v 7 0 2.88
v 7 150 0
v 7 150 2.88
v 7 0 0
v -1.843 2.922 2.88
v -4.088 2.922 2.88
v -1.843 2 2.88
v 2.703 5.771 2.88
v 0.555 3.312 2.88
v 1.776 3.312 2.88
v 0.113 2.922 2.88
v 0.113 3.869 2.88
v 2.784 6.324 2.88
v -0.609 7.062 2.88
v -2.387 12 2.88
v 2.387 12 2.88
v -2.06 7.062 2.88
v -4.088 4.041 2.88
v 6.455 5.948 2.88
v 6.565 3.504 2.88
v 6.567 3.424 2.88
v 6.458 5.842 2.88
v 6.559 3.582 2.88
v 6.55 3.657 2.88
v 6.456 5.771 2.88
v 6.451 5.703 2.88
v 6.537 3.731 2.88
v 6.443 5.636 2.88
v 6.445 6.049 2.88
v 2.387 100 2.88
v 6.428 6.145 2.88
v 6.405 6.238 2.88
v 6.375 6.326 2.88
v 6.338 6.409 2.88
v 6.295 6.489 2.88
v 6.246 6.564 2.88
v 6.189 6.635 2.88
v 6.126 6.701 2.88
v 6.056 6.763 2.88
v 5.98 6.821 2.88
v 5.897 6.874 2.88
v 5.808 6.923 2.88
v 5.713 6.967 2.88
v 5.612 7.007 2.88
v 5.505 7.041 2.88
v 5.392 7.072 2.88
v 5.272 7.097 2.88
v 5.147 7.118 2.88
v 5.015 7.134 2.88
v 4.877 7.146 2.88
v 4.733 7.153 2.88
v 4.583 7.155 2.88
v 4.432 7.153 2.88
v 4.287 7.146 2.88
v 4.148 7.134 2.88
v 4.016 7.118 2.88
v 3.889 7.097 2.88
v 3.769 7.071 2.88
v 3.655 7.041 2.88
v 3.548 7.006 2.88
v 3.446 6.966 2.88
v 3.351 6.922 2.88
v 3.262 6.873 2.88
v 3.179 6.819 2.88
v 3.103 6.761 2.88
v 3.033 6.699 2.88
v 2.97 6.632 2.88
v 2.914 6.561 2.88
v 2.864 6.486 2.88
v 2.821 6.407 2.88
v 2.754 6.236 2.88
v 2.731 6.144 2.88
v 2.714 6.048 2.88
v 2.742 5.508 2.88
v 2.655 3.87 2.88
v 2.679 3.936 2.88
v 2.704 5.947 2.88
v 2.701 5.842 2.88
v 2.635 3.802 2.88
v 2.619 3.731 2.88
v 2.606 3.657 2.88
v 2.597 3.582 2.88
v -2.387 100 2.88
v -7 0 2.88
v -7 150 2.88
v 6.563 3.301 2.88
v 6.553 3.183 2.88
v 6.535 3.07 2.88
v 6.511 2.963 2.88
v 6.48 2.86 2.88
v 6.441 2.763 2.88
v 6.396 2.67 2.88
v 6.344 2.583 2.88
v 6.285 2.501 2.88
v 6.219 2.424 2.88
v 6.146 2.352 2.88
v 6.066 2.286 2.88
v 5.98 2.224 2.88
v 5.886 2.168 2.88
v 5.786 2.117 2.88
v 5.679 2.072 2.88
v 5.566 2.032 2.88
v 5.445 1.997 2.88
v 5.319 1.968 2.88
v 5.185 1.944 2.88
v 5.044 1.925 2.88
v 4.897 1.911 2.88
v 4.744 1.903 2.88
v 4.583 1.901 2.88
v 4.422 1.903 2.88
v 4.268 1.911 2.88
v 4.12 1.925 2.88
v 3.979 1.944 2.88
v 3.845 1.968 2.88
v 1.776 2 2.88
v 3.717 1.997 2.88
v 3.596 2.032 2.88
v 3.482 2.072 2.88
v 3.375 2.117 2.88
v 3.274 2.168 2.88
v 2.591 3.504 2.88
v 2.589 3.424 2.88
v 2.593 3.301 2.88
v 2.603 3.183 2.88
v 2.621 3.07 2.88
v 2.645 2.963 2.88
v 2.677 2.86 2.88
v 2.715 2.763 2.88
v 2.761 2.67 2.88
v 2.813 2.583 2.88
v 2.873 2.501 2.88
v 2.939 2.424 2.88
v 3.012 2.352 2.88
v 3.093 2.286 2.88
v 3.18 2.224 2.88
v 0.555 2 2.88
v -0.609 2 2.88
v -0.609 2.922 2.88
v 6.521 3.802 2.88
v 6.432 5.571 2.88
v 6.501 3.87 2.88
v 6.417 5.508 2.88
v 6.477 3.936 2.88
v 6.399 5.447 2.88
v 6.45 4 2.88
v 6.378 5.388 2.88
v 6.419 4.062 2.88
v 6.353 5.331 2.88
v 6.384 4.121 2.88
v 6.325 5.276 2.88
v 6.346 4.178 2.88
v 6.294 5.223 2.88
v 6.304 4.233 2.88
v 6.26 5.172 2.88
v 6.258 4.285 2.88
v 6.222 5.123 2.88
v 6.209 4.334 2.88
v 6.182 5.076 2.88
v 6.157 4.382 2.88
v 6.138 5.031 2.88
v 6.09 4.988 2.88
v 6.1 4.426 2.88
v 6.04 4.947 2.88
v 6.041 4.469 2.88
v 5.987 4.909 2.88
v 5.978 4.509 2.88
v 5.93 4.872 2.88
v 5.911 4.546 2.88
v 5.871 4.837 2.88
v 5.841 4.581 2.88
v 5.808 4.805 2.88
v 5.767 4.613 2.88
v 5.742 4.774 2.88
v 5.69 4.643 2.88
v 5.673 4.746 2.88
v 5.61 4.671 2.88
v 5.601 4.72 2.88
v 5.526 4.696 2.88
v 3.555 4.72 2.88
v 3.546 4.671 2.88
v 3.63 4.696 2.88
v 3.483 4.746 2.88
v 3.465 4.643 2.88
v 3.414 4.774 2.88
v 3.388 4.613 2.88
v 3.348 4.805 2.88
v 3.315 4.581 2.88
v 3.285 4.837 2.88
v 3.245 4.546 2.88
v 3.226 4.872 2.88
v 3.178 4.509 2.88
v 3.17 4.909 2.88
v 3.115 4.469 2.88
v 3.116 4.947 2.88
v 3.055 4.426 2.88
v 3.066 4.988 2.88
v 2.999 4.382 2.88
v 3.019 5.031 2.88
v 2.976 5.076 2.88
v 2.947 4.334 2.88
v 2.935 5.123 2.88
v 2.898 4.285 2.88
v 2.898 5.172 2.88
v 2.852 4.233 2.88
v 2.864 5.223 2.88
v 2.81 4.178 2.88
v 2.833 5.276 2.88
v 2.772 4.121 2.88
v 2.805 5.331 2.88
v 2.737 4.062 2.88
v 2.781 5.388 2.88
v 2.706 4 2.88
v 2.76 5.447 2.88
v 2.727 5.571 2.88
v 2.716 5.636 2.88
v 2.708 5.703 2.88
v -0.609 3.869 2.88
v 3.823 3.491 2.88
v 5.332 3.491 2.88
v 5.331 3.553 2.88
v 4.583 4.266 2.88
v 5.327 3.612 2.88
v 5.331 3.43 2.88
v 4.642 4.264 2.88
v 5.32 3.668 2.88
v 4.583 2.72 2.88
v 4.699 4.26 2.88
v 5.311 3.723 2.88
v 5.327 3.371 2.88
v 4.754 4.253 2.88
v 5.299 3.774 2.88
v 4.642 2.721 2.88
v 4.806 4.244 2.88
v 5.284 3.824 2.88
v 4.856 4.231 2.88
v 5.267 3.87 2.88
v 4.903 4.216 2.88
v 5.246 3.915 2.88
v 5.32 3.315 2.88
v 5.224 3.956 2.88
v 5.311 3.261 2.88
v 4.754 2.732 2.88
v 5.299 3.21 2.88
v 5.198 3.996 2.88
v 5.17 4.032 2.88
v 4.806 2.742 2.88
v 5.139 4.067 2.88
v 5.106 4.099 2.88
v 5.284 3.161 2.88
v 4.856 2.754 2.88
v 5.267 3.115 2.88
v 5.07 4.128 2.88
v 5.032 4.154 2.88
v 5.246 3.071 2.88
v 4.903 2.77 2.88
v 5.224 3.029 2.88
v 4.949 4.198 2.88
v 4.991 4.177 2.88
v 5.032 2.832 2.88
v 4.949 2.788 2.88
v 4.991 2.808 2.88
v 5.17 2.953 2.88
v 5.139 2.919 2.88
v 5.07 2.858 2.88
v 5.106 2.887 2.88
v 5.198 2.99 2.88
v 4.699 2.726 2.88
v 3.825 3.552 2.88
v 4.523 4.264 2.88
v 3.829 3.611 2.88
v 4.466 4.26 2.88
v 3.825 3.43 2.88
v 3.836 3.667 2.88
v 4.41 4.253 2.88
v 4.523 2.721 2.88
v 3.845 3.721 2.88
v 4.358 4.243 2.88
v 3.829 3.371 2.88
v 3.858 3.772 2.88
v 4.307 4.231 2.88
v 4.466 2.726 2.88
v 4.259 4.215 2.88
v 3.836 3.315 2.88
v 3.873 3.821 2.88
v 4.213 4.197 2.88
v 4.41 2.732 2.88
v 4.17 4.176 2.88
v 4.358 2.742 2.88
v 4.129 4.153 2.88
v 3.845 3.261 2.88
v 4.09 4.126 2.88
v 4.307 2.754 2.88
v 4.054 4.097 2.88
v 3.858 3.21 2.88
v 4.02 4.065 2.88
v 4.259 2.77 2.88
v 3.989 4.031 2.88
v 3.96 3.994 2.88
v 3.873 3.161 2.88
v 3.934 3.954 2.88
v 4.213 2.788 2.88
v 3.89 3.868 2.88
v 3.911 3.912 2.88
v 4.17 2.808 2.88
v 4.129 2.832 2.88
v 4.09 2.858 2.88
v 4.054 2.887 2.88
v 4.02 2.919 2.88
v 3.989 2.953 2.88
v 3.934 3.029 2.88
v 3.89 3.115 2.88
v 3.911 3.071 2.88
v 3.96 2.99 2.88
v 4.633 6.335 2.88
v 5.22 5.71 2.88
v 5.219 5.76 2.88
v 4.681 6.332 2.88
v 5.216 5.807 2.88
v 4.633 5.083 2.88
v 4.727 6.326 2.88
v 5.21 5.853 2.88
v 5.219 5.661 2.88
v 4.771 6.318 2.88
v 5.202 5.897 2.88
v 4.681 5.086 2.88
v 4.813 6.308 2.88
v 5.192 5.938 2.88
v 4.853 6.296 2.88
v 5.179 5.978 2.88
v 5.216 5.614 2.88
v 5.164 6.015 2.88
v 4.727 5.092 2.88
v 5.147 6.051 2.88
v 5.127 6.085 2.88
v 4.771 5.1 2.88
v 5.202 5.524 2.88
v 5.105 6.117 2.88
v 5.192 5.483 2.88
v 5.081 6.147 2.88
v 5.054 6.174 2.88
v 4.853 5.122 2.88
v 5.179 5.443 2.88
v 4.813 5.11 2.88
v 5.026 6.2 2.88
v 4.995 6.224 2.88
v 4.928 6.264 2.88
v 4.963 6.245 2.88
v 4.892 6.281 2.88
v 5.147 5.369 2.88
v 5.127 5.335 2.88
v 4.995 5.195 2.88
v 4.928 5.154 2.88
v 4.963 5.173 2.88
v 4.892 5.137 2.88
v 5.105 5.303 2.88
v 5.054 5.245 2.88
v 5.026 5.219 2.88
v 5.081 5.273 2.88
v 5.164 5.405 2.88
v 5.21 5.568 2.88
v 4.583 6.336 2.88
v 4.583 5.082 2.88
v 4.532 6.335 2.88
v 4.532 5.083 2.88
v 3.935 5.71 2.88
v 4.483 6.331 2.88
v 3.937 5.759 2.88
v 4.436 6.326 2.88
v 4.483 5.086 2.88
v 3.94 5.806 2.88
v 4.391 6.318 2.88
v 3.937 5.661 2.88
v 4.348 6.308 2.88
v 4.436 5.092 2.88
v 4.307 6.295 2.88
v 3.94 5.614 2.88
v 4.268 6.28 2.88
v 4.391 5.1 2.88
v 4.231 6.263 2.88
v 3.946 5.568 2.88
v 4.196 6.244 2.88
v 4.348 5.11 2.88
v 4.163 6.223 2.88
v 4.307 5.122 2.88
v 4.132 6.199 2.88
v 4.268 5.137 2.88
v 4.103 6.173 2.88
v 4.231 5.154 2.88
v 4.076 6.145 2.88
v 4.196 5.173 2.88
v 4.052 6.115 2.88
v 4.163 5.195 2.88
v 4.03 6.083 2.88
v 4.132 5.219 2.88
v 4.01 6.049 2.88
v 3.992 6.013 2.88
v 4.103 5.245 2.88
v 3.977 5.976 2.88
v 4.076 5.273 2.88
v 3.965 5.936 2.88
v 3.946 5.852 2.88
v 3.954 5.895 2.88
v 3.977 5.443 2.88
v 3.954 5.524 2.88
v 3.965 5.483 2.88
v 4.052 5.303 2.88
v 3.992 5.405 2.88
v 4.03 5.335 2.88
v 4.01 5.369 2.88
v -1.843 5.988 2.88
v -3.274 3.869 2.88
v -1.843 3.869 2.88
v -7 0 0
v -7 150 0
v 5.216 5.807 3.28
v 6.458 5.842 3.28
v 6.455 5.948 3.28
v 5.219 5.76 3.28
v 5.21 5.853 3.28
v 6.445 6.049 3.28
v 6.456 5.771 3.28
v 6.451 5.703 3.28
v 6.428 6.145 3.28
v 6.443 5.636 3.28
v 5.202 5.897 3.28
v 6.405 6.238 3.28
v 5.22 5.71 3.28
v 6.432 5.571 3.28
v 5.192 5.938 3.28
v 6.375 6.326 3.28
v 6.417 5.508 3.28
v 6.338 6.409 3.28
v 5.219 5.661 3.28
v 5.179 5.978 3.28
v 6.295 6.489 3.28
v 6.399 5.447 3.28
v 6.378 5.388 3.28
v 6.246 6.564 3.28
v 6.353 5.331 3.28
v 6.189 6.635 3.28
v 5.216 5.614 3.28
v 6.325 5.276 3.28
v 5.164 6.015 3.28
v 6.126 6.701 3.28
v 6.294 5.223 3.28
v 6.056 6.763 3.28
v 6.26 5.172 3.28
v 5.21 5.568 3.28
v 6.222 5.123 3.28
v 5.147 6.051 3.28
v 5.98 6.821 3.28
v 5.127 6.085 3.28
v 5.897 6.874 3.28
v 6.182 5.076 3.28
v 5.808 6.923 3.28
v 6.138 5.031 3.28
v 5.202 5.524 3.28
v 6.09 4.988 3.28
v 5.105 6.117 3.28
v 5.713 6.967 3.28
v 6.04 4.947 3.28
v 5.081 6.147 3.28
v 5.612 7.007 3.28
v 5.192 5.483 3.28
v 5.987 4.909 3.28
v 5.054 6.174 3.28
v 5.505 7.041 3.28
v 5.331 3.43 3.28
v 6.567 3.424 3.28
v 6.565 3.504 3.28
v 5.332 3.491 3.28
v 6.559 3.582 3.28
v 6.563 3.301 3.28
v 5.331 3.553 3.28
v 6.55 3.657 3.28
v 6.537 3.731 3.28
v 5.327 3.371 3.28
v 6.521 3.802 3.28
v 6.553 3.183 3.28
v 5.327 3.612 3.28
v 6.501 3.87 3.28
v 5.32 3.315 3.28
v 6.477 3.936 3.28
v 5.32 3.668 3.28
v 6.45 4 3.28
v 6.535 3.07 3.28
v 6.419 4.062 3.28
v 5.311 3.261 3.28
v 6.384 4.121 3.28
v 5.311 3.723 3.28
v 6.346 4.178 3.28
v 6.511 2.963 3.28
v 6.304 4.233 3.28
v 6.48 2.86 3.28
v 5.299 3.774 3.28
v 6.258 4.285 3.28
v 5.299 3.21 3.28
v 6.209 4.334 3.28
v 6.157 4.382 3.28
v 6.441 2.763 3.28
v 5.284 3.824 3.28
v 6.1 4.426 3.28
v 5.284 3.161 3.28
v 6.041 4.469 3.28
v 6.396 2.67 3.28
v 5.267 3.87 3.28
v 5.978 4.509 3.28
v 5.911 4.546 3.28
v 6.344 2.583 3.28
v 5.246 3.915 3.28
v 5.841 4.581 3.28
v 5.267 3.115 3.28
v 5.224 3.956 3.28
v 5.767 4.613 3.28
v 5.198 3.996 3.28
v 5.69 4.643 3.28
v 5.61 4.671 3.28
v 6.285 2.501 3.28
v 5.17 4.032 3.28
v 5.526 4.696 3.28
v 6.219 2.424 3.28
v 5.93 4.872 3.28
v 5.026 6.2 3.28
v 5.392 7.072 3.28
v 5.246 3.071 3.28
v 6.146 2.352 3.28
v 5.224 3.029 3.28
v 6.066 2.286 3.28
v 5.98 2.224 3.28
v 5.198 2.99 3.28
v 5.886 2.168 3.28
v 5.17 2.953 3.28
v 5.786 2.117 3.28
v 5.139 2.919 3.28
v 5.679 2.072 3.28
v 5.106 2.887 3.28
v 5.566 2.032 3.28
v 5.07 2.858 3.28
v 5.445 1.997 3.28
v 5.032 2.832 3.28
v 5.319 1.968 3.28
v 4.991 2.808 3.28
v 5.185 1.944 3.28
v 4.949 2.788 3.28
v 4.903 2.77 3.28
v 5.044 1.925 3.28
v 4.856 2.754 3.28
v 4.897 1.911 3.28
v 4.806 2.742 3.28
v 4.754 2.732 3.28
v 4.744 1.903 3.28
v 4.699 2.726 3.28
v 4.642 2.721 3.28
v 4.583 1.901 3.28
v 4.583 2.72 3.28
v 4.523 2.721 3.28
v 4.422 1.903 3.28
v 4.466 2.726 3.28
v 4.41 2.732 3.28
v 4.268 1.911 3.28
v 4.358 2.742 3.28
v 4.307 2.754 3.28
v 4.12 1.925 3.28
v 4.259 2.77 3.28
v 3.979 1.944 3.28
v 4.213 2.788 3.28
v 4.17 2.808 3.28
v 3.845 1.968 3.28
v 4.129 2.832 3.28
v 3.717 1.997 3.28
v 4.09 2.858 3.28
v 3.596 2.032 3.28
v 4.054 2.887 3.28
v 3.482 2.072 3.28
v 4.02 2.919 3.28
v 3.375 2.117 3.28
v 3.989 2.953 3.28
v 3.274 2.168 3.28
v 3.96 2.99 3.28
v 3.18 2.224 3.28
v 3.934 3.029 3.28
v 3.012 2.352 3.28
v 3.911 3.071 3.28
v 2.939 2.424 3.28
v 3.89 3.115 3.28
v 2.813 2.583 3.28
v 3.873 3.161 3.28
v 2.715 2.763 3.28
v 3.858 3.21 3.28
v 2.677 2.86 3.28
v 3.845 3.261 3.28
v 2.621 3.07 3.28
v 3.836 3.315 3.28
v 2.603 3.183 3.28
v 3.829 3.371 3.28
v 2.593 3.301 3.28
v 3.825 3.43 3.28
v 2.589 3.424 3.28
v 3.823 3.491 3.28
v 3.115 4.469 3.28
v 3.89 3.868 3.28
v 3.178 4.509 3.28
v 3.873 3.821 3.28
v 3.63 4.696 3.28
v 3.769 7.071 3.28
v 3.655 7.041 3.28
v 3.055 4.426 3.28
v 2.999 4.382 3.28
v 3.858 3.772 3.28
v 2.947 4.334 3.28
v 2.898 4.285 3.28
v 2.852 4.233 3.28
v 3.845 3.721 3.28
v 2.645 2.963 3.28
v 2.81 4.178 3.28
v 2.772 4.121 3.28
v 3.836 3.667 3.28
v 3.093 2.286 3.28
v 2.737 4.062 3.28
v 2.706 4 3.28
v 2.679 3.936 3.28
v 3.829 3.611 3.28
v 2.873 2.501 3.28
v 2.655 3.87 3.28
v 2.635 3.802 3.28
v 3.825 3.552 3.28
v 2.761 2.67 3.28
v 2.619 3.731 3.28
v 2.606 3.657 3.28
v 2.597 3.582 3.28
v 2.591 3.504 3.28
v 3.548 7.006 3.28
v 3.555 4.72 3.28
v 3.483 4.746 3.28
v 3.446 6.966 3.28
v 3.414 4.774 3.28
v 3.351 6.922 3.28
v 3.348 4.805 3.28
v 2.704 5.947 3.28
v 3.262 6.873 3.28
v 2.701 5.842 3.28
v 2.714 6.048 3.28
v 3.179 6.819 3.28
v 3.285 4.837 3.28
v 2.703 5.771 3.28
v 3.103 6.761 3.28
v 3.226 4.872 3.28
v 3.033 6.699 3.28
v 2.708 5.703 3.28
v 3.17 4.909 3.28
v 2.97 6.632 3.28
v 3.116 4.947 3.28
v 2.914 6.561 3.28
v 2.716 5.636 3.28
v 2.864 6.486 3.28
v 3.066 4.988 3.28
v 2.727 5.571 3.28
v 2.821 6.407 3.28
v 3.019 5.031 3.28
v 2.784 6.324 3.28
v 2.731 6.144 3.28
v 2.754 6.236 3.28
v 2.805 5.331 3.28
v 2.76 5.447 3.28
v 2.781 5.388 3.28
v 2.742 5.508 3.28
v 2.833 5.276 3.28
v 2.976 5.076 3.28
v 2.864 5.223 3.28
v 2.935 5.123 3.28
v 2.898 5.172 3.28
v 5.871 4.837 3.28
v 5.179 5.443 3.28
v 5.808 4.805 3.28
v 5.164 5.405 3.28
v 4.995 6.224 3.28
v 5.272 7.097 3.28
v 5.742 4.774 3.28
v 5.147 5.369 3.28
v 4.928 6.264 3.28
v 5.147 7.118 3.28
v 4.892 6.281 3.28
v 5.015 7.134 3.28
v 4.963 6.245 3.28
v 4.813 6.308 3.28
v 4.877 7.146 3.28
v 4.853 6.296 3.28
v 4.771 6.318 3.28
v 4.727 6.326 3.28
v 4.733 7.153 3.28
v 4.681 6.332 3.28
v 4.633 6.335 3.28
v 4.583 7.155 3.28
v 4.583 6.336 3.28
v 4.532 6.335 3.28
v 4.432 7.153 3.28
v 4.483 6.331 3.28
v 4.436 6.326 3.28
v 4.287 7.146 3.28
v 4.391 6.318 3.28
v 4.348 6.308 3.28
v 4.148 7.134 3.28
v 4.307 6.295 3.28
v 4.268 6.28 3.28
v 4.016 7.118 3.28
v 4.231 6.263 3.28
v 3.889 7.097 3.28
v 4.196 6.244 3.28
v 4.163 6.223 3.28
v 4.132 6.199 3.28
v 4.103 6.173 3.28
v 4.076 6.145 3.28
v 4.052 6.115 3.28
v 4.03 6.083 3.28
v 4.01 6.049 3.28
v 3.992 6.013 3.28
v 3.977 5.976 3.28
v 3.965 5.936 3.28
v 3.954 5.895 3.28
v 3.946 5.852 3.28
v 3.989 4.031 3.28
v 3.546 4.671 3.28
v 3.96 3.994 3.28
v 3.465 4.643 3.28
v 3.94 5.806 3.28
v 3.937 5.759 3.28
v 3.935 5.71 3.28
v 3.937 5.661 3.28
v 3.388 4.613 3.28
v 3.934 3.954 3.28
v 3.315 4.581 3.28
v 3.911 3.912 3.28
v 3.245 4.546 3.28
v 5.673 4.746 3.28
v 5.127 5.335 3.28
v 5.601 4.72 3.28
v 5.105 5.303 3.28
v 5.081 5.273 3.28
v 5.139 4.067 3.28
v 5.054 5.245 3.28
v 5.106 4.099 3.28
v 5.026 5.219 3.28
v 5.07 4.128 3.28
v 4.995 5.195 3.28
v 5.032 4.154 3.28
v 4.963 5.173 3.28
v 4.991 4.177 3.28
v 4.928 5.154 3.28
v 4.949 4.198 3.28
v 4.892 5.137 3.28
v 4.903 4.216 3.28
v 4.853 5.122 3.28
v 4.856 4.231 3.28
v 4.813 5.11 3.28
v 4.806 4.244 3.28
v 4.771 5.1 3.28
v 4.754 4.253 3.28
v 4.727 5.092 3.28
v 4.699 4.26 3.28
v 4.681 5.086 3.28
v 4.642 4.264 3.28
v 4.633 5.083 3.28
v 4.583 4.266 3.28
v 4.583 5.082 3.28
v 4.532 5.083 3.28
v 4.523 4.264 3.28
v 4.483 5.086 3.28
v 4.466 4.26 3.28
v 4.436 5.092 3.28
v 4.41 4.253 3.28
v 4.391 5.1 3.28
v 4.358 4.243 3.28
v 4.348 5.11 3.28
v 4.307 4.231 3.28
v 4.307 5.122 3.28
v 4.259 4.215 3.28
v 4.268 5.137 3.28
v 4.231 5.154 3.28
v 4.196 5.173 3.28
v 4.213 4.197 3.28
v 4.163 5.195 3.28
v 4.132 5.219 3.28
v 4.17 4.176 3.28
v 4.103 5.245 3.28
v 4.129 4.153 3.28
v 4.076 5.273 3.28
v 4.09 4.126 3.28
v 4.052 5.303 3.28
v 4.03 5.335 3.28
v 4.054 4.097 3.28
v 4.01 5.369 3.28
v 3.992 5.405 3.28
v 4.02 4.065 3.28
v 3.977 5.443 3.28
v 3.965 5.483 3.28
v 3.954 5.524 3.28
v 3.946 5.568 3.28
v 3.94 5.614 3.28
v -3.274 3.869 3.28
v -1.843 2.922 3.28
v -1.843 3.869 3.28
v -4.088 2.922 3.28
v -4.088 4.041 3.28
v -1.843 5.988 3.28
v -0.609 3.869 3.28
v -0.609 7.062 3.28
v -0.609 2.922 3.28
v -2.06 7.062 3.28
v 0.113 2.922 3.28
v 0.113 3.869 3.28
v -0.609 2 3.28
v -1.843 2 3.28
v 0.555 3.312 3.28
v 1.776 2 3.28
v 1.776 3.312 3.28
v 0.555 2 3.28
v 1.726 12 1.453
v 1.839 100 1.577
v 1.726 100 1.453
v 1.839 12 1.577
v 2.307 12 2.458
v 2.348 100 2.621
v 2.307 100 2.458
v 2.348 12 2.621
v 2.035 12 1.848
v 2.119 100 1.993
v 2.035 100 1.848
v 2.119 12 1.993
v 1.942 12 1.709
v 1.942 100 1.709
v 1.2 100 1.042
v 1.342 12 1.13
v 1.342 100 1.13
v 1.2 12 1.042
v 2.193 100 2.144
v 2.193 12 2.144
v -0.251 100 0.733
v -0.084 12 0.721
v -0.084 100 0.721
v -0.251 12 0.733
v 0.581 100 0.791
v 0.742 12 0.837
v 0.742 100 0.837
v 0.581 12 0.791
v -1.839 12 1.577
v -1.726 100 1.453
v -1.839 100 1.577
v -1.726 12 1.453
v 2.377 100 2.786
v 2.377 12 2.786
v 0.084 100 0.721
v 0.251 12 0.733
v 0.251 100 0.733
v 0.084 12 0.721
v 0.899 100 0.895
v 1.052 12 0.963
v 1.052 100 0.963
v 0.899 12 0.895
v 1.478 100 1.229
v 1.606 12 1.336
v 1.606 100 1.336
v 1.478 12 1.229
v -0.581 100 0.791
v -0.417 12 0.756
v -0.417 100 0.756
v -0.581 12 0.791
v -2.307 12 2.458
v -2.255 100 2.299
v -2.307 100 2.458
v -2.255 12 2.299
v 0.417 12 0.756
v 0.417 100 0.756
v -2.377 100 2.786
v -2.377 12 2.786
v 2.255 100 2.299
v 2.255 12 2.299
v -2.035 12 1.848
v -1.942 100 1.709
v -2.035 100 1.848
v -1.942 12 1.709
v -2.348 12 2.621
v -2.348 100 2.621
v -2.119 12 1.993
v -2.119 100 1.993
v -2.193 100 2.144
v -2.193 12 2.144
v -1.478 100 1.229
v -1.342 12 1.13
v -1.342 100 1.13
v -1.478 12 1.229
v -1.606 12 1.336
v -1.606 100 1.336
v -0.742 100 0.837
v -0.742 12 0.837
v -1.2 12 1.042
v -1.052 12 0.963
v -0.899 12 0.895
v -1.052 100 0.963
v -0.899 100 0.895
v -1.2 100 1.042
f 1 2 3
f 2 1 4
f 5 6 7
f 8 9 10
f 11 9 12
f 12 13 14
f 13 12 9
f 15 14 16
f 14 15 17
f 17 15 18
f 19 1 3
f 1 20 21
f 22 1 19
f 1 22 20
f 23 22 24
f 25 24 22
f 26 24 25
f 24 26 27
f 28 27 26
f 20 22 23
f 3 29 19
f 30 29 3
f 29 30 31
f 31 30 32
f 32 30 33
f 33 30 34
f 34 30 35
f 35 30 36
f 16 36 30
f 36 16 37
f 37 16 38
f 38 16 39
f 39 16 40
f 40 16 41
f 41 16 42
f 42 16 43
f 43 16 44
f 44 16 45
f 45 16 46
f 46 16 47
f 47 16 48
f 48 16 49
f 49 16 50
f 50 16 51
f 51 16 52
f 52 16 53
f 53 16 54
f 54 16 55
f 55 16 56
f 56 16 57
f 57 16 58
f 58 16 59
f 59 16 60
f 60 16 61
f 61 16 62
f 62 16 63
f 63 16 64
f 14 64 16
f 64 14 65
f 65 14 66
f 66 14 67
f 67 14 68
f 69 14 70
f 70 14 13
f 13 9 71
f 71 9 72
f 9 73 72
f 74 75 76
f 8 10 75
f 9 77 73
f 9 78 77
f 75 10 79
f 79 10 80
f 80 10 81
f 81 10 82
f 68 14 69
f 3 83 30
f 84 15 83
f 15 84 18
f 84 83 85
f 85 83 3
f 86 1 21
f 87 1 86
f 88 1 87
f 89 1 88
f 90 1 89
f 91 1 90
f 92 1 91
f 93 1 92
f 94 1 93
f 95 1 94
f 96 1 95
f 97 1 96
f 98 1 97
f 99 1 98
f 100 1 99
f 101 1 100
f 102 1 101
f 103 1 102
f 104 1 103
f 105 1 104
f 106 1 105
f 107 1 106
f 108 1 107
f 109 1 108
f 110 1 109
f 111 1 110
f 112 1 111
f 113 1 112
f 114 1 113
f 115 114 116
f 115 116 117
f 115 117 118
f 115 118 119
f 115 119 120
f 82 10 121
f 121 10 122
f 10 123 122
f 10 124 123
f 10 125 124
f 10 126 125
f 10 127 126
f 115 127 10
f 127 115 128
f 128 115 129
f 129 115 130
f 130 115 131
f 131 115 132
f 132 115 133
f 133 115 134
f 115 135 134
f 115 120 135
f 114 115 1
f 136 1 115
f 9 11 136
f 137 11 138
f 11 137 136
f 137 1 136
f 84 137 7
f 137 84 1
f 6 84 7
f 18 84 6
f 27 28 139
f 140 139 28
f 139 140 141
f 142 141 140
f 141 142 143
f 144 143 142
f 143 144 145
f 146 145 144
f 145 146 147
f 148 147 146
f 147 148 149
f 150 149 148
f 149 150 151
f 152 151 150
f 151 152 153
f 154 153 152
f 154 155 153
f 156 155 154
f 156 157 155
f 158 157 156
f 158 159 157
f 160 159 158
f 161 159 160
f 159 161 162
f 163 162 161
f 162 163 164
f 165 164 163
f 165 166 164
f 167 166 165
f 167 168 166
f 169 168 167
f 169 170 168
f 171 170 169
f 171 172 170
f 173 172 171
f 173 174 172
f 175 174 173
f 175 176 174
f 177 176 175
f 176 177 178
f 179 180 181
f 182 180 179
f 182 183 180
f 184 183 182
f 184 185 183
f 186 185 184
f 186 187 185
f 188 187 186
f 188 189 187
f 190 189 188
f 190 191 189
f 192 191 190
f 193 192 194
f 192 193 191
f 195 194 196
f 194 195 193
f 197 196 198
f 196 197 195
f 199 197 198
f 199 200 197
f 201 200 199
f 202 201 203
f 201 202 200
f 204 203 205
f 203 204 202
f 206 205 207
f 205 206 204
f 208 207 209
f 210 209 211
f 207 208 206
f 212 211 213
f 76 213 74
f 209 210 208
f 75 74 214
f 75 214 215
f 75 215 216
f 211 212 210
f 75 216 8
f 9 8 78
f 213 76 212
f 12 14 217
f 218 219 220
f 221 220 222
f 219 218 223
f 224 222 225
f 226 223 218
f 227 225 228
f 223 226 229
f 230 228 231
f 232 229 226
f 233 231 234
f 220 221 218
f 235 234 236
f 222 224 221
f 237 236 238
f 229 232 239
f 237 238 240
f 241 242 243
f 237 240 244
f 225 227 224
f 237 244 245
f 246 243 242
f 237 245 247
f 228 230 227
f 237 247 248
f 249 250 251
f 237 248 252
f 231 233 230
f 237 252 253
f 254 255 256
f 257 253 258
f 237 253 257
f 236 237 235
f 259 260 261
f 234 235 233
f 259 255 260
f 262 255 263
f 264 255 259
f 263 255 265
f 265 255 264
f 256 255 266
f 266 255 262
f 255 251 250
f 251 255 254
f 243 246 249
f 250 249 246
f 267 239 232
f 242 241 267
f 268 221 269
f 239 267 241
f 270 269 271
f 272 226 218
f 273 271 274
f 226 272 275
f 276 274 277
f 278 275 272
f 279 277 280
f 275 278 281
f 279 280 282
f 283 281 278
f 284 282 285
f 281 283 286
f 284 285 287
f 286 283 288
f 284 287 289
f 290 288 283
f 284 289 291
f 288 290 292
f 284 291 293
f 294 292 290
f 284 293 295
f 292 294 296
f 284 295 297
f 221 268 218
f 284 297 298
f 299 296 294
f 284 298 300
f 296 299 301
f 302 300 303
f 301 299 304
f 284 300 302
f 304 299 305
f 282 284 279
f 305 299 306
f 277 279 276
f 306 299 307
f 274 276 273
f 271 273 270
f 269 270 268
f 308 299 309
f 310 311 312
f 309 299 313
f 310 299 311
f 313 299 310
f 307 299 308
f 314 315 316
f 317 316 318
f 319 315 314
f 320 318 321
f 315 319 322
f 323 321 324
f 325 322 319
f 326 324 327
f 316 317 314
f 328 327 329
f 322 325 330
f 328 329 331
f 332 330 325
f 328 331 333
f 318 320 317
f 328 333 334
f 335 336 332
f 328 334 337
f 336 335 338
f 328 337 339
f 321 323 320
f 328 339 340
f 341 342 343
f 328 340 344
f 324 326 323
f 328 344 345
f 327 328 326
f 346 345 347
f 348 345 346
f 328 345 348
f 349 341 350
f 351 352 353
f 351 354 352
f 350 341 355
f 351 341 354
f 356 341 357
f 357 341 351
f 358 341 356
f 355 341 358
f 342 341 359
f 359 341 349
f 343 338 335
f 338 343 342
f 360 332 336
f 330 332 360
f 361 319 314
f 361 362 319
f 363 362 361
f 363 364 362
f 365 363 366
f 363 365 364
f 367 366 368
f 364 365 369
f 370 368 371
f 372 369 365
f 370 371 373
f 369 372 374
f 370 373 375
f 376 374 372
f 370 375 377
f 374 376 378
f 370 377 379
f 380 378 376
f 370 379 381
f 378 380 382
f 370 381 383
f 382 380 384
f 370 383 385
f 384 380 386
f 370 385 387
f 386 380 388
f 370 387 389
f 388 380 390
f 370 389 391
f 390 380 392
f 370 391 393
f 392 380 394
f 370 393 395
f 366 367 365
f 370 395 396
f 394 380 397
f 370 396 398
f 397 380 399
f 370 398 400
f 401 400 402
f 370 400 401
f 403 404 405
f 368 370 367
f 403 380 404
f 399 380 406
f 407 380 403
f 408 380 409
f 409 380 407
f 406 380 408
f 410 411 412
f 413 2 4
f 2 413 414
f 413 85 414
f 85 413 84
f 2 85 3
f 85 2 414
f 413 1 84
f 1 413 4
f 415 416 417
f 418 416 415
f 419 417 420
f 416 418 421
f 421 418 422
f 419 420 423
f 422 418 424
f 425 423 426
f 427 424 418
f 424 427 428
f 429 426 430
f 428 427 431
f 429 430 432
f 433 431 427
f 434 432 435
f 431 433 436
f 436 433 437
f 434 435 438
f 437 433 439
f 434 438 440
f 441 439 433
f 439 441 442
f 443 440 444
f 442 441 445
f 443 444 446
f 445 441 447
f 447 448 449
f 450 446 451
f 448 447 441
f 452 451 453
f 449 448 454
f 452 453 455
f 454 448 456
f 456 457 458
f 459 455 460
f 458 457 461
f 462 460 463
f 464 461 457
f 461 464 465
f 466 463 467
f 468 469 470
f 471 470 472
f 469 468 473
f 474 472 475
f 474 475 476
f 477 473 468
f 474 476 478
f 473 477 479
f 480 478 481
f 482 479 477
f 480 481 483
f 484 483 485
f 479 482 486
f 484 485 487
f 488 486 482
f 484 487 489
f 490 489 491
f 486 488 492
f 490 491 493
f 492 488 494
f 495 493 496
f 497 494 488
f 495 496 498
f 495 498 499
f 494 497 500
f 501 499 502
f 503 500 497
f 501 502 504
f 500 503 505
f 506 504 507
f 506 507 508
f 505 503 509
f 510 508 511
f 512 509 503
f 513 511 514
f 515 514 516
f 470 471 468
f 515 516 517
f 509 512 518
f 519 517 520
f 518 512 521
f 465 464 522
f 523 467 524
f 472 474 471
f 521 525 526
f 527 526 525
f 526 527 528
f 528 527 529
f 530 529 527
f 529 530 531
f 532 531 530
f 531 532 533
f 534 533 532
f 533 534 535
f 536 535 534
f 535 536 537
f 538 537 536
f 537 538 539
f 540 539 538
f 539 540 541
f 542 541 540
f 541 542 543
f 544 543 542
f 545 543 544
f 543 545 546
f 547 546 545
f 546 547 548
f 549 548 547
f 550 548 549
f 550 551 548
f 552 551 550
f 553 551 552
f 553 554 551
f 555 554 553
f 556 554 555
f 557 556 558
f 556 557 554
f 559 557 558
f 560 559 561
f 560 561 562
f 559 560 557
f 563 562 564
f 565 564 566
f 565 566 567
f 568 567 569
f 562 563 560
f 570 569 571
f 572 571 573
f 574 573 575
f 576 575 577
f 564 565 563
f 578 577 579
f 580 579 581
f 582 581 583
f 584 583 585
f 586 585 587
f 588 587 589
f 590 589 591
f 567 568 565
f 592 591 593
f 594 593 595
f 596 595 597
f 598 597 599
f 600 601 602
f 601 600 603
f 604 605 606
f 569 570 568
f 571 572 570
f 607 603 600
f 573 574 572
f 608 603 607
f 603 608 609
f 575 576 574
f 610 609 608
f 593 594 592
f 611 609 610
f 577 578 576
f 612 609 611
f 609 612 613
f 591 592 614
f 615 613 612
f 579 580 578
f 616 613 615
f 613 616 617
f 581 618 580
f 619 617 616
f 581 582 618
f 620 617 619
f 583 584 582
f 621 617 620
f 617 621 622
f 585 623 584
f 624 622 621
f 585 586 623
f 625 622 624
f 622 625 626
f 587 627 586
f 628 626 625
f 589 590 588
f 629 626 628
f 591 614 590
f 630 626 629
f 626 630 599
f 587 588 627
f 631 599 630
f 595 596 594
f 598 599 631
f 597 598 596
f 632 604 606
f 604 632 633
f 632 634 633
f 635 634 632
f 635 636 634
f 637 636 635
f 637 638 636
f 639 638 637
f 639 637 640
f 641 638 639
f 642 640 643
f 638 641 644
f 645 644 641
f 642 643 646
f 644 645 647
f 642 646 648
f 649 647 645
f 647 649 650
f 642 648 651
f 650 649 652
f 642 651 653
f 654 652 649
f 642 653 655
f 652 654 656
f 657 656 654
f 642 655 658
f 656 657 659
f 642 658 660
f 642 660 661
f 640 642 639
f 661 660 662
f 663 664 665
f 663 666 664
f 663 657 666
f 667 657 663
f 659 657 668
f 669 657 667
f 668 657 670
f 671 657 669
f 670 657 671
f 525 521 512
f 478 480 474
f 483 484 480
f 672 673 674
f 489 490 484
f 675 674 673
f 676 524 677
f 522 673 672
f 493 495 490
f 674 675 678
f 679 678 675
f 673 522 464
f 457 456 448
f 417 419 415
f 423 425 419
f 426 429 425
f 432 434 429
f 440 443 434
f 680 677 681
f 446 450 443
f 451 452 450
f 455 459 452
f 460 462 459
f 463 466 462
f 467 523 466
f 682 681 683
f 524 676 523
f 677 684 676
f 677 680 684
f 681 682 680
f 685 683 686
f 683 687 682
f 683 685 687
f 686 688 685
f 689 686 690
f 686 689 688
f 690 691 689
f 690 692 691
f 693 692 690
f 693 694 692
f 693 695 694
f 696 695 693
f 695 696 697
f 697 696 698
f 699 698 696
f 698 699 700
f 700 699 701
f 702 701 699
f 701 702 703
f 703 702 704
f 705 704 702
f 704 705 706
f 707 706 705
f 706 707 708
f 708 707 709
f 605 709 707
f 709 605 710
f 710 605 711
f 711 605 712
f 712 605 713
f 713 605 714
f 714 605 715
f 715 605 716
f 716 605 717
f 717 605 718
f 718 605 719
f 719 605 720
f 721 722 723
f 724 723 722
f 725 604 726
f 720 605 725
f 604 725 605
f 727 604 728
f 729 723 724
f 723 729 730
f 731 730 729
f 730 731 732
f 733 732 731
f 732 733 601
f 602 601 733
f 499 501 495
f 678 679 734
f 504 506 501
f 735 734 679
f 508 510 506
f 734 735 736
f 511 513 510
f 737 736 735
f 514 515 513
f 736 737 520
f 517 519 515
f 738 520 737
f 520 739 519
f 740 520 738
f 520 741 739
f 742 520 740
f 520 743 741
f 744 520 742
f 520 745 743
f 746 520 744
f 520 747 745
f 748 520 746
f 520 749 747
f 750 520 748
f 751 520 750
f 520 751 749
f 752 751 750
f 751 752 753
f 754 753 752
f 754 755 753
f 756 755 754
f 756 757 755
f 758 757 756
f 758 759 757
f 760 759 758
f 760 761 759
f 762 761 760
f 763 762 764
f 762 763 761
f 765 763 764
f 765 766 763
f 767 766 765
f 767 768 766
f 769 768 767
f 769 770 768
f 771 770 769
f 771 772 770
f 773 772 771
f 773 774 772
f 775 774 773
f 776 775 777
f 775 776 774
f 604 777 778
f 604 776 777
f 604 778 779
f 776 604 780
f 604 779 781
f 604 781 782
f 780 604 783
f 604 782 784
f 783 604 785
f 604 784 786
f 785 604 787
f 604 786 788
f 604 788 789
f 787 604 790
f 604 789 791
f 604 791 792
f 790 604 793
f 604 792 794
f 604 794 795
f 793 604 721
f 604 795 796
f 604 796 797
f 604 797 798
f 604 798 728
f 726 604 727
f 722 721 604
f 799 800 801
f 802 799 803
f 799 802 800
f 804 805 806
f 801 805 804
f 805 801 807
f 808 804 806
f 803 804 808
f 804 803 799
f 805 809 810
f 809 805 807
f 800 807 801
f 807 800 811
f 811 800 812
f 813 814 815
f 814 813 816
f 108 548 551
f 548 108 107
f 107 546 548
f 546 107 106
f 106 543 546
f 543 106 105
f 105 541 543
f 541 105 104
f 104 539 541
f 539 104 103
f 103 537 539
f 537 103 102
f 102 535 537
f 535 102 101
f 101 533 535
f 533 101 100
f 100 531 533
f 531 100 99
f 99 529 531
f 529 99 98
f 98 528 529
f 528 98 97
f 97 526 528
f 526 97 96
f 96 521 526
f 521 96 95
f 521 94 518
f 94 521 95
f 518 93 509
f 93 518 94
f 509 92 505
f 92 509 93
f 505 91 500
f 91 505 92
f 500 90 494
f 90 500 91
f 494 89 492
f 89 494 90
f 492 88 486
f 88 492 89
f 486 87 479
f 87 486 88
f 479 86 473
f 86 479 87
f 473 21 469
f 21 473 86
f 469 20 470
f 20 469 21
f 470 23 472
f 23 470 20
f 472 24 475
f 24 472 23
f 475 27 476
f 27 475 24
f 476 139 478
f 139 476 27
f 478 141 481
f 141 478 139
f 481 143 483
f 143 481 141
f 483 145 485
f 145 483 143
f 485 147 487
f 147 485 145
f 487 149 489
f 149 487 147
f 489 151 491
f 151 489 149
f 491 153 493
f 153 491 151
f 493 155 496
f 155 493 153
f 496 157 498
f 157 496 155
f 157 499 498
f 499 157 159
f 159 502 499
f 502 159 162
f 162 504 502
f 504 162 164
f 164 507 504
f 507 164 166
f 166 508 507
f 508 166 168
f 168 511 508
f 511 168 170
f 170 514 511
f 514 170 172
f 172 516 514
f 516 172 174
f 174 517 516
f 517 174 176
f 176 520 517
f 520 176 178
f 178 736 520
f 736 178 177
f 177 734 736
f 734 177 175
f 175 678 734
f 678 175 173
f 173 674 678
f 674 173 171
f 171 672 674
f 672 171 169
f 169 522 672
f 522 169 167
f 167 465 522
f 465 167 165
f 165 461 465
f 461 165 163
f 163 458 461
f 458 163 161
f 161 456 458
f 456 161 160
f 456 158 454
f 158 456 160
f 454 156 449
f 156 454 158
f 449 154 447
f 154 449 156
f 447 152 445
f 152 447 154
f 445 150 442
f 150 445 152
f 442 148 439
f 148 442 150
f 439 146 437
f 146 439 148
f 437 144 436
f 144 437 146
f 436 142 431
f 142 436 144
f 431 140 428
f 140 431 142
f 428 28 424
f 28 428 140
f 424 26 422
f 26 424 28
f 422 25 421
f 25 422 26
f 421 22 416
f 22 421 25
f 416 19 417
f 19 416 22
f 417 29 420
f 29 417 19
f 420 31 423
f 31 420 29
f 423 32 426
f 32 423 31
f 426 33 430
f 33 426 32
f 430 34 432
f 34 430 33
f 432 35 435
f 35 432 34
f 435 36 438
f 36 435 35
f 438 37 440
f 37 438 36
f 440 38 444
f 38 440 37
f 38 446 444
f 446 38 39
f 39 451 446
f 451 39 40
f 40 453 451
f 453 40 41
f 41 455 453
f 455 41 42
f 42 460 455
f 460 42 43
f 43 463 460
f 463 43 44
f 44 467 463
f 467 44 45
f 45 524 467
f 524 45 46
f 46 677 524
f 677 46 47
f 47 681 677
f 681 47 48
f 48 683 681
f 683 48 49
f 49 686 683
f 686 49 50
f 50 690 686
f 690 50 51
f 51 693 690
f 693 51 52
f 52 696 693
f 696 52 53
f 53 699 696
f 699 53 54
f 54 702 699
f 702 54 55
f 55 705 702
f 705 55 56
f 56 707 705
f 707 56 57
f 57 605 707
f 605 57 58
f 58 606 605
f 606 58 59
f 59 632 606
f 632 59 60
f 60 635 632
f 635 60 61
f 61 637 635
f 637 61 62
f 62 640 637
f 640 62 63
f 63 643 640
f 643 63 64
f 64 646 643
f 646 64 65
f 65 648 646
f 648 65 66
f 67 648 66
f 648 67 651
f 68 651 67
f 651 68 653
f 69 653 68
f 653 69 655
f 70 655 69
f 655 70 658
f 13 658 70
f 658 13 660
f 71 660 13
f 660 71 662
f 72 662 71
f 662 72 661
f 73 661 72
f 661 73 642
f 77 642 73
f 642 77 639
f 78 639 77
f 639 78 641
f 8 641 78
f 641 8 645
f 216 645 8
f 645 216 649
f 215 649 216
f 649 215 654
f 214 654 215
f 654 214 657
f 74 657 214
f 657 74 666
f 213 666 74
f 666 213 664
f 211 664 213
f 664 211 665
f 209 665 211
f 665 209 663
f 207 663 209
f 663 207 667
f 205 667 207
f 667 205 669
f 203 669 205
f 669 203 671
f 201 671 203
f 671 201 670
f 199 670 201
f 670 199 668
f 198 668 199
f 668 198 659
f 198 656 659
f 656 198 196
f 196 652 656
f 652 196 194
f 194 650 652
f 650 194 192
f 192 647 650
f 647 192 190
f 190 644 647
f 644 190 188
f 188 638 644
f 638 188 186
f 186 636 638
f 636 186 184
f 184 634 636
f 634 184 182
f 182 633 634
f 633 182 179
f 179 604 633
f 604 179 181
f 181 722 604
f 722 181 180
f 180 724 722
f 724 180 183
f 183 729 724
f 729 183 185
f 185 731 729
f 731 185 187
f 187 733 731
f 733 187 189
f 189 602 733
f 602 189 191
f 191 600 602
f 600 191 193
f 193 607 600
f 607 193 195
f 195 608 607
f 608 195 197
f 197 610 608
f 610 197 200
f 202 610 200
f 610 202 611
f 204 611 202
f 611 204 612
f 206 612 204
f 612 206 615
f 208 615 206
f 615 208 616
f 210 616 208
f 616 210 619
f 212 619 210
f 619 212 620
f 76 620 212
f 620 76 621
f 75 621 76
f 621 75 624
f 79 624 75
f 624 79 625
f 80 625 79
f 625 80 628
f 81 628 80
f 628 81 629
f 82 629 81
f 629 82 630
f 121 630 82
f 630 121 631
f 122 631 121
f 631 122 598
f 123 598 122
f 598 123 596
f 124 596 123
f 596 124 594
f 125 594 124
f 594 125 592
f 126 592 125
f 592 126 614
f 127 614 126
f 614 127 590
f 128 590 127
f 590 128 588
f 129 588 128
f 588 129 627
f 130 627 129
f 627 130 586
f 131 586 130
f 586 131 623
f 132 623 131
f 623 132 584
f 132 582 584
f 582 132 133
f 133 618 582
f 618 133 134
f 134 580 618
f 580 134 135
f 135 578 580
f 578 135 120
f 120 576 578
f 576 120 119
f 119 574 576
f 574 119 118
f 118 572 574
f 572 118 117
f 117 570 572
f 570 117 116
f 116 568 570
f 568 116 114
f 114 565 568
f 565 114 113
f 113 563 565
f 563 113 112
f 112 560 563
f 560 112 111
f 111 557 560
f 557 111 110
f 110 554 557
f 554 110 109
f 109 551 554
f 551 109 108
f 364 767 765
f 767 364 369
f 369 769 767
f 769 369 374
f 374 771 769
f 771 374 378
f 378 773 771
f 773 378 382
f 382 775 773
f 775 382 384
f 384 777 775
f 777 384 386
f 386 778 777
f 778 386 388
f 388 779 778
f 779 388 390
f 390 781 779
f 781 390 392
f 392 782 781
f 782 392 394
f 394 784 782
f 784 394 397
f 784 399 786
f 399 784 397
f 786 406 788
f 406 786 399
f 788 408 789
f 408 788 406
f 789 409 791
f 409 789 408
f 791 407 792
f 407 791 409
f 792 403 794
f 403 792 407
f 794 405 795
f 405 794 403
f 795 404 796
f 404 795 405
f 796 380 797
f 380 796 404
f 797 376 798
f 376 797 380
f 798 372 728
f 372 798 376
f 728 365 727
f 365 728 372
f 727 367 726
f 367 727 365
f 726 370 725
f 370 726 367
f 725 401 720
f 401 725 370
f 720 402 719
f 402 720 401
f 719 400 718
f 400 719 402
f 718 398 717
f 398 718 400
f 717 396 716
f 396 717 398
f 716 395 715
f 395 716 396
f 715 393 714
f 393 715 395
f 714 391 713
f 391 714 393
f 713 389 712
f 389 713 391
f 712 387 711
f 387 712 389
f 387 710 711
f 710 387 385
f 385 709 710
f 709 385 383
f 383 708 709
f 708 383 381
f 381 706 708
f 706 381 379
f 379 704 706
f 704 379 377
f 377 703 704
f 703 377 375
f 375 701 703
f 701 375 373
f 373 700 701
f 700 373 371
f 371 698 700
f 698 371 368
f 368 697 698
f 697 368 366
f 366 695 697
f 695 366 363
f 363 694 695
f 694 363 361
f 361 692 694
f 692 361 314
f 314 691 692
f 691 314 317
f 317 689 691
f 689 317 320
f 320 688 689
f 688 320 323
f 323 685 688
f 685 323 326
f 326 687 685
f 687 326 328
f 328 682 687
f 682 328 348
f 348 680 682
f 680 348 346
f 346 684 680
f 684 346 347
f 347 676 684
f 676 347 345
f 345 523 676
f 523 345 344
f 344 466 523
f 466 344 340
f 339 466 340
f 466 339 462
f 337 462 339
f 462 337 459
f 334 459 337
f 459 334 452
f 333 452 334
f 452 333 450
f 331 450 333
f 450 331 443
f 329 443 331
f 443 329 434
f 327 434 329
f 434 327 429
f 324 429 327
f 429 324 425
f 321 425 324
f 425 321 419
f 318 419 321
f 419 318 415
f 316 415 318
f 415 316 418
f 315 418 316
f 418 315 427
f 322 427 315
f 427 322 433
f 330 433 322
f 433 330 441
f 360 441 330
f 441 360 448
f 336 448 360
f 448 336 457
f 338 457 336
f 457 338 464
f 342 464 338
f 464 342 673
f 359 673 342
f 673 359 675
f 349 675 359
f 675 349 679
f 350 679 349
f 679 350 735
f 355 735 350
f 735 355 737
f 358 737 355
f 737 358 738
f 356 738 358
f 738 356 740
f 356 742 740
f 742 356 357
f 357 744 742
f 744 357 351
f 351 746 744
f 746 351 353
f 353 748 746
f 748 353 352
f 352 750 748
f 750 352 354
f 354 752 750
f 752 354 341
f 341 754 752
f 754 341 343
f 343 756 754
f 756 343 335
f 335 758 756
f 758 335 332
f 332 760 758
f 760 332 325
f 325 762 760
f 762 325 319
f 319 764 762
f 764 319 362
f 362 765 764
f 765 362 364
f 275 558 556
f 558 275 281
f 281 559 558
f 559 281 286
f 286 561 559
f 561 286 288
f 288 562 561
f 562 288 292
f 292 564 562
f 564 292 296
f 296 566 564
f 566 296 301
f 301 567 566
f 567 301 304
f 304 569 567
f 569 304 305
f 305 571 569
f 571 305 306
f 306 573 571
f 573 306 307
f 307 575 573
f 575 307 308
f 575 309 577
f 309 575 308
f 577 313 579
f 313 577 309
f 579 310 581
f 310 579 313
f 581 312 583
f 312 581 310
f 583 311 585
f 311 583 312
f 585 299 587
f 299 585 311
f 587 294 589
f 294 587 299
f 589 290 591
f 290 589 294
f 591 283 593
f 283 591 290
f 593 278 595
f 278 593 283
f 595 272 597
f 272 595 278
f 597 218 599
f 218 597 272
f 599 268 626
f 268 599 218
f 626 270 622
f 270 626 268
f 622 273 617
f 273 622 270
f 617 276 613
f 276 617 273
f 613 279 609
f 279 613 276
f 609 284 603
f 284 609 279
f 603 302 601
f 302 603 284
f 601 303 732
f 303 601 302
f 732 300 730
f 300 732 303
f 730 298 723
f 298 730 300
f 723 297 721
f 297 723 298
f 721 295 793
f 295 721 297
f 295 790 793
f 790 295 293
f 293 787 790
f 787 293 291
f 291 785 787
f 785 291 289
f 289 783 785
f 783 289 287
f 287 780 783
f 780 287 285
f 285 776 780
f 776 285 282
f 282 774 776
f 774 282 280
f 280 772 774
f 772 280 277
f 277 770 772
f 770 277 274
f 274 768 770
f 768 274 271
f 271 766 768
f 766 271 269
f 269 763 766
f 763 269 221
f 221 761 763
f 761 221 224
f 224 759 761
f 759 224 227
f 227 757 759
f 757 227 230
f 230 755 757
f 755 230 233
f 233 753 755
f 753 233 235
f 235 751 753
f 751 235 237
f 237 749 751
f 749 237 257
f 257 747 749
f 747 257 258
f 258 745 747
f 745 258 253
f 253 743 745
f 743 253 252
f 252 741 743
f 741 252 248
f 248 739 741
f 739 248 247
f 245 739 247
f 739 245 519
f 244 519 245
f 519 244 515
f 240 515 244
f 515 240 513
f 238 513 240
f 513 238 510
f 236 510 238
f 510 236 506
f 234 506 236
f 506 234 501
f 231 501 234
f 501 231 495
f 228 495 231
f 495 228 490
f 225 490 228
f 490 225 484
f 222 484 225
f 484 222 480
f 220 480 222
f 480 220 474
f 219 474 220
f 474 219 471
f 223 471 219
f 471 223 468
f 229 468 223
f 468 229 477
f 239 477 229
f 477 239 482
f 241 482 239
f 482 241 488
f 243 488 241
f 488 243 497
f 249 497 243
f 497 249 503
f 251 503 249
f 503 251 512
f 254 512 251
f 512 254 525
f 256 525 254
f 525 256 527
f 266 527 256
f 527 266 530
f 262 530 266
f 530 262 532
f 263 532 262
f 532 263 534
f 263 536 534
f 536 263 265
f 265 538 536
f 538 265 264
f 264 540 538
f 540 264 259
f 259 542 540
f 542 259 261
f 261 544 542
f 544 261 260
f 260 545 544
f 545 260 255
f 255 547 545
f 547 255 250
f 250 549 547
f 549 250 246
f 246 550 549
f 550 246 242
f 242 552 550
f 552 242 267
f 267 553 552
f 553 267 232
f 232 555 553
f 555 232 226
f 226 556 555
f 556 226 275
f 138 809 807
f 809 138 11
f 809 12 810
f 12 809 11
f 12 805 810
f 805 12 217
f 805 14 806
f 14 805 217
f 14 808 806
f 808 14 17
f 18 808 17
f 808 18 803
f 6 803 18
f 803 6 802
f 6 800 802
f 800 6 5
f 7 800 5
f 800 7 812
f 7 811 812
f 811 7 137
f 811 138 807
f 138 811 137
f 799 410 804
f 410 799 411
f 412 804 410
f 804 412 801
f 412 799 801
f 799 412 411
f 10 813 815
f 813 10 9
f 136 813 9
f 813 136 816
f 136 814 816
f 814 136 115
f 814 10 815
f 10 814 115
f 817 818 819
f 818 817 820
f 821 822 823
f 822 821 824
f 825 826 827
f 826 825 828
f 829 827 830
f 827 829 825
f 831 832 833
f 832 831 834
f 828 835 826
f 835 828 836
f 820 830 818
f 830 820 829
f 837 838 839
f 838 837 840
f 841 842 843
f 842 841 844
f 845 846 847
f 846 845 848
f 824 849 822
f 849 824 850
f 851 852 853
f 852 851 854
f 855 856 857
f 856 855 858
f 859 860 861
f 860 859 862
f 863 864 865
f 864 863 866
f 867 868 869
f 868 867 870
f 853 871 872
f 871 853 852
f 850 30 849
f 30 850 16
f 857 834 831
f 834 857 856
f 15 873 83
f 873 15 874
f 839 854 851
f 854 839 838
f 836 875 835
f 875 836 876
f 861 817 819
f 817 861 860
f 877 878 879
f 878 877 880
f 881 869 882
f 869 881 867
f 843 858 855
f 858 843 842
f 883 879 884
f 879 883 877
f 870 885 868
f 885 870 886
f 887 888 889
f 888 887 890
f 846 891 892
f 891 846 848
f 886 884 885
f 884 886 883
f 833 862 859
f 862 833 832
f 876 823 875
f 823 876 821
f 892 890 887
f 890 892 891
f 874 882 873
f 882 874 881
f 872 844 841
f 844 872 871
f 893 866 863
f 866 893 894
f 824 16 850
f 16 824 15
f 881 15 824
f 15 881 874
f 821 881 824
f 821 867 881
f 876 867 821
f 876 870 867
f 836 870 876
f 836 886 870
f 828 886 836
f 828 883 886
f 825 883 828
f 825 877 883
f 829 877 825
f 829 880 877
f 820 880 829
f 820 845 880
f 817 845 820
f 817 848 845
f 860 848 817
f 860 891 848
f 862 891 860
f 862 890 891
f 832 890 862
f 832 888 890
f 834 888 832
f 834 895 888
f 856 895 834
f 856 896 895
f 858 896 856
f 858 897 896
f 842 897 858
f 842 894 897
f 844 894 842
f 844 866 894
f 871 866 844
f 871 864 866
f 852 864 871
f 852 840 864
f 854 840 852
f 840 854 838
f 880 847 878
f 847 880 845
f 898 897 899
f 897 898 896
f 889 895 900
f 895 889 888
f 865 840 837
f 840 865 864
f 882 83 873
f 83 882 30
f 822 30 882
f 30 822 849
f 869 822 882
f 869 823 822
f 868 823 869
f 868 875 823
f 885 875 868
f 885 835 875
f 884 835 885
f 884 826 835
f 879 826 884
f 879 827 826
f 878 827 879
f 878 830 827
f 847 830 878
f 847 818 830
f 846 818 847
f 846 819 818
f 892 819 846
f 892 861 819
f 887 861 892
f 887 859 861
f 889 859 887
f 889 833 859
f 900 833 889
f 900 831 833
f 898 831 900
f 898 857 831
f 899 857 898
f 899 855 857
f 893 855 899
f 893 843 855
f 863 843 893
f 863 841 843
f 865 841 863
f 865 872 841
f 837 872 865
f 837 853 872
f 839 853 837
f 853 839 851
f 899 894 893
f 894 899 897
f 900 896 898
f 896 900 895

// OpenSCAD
// file: module/drill-bit-storage.scad
/*
    Drill bit storage
*/

$fn=90;  // accuracy


// Constants (Don't change)
storageLenght = 100; // Not Bit lenght
maxBitLenght  = 70;  // Check bit lenght
storageWidth  = 10;  // Minimum width

// Bit dependent
bitDiameter = 4.0;



module drillBitStorage (bitDiameter,maxBitLenght,
	storageWidth,storageLenght){

// Automatic Variables  (Don't change)
diameterText      = str(bitDiameter);
storageHight      = bitDiameter*0.6; 
bitRadius         = bitDiameter/2;
bitPositionHeight = storageHight+bitDiameter*0.05; 


// Delition for crating drill track
difference() {

// Union for text and storage
union(){

// Storage 
translate([
    -storageWidth/2,    // Centering
    0, 
    0
    ]) 
cube(size = [
    storageWidth,
    storageLenght,
    storageHight
    ]);

// Milimiter dimension text
translate([
    -4.4,               // Fine deling x-axis
    2,                  // Fine deling y-axis 
    storageHight         
    ])
linear_extrude(height=0.4)text(
    diameterText,  // Dynamic text
    size=5,
    font="tohoma:style=bold",
    spacing=0.9
    );
    
// End of union    
}  

// Begining of Delition
// Drill tracl
rotate([90,0,0])
translate([
    0,                   // x-axis
    bitPositionHeight,   // Z-axis
    -(maxBitLenght+12)    // y-axis
    ])  
cylinder(
    h = maxBitLenght,    // y-axis
    r = bitRadius        // x-axis 
    );      

// End of Delition
}}
// main file
/*
    Drill bit storage
*/

$fn=90;  // accuracy

// import module
use <module/drill-bit-storage.scad>;



// Tootale lenght of the unit
storageLenght = 150; 

// Width of the unit
storageWidth  = 14;  // (Constant under 4mm)  

// The lenght of the drill bit
maxBitLenght  = 88;  

// Drill bit diameter  
bitDiameter = 4.8;


// Call the module
drillBitStorage 
    (bitDiameter,maxBitLenght,storageWidth,storageLenght);
